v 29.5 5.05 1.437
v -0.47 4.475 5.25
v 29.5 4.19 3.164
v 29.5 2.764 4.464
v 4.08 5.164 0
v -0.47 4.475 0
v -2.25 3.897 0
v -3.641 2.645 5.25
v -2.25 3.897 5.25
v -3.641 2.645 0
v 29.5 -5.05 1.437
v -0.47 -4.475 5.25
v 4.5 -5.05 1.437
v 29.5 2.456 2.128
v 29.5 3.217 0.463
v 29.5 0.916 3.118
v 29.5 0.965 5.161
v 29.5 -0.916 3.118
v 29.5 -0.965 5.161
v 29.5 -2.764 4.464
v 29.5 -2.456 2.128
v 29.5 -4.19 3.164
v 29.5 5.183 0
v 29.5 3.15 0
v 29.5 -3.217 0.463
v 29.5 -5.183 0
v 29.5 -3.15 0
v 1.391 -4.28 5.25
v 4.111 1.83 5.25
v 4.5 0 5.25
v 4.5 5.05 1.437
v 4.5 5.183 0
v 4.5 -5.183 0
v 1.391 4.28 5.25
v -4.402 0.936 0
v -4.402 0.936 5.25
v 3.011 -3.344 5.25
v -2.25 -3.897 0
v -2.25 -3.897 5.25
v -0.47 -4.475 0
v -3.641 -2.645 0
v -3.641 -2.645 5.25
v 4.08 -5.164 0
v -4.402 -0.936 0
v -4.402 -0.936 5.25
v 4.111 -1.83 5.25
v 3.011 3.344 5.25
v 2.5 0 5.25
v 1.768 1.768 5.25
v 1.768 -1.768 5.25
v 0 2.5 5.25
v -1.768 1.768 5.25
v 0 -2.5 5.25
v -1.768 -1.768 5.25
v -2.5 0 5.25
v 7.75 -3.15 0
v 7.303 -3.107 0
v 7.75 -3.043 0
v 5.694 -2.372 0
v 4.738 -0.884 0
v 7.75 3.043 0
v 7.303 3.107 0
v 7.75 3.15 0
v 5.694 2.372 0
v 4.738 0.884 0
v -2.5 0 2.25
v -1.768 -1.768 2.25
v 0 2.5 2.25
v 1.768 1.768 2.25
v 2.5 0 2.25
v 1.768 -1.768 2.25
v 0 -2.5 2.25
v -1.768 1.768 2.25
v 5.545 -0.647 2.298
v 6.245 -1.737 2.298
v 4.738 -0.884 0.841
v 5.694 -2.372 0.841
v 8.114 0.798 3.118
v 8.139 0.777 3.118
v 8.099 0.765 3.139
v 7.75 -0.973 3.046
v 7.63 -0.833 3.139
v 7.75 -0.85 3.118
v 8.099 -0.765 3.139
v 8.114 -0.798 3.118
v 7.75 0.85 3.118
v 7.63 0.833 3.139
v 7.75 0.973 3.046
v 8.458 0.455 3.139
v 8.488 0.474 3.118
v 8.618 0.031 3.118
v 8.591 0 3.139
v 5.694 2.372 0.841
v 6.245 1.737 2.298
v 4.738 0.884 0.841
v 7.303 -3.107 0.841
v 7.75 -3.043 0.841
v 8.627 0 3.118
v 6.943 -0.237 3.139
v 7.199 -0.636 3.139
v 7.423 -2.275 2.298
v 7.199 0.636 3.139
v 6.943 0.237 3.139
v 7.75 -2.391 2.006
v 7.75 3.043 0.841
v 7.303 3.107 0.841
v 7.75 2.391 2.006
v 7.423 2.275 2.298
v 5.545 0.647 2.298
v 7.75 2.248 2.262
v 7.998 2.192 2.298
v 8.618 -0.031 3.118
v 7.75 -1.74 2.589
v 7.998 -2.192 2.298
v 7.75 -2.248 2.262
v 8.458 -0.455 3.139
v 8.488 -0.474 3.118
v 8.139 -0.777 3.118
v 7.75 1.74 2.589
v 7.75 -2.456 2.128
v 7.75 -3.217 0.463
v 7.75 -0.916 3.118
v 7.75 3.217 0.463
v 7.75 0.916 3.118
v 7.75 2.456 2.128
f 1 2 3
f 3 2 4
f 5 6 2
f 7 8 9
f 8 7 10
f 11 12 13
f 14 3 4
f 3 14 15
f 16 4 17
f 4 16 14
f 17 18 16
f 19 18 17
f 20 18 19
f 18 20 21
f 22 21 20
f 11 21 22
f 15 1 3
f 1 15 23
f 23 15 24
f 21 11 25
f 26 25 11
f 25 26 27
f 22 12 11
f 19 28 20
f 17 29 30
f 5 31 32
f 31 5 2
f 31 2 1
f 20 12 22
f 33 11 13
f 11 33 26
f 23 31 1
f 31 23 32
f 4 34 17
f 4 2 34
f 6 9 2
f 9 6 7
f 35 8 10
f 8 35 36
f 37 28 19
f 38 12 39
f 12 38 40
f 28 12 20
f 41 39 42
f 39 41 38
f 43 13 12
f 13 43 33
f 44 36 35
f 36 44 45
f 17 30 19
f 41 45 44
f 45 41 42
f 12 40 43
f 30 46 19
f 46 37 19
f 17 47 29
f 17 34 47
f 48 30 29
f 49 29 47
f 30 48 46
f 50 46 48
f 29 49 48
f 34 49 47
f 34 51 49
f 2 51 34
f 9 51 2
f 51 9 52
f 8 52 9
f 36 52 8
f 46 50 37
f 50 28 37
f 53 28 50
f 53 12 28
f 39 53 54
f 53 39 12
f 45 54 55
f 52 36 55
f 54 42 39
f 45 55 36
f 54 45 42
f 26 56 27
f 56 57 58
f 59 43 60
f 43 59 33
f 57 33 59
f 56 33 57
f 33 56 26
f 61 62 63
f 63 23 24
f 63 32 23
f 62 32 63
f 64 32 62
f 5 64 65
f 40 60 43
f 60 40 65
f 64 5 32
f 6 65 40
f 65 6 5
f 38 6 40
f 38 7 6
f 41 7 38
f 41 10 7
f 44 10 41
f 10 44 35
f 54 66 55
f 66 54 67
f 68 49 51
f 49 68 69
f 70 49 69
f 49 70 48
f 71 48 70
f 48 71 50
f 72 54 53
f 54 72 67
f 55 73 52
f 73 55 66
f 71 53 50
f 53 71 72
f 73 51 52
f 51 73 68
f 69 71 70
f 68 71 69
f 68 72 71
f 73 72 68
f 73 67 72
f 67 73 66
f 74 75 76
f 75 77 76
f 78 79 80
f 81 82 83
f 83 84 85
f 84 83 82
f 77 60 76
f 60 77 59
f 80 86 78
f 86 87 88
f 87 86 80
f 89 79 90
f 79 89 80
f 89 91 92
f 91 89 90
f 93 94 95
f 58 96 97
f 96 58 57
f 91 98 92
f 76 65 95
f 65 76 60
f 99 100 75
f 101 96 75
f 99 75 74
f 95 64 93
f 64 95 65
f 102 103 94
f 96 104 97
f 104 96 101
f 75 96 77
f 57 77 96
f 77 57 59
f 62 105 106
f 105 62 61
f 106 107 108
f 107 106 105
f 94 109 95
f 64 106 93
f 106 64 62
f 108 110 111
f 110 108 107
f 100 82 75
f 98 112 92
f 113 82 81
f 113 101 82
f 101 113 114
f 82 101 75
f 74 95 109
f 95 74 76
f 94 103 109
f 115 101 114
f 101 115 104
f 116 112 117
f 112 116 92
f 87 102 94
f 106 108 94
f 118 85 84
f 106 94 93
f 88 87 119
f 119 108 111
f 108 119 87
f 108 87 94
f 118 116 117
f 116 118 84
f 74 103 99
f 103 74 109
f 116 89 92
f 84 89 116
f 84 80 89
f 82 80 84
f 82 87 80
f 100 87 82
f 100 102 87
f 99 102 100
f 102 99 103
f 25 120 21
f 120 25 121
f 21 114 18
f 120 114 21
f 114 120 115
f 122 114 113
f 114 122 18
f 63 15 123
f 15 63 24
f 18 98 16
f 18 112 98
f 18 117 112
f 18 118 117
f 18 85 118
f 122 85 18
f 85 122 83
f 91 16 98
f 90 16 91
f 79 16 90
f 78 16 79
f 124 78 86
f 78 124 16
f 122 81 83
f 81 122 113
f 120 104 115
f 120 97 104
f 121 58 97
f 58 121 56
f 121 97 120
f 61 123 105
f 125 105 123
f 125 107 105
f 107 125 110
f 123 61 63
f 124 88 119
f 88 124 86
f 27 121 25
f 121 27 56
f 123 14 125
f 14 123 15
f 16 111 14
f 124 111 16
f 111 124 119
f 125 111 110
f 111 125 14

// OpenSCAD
// Uncomment before final render
//$fa = 0.01;
//$fs = 0.25;

module cAxisServoArm() {
  difference() {
    hull() {
      cylinder(5.25, 4.5, 4.5);
      translate([4.5, 0, 0]) {
        rotate([0, 90, 0]) {
          cylinder(25, 5.25, 5.25);
        }
      }
    }
    translate([-5.5, -6.125, -6.25]) {
      cube([36, 12.25, 6.25]);
    }
    translate([0, 0, 2.25]) {
      cylinder(4, 2.5, 2.5);
    }
    translate([7.75, 0, 0]) {
      sphere(3.25);
    }
    translate([7.75, 0, 0]) {
      rotate([0, 90, 0]) {
        cylinder(22.75, 3.25, 3.25);
      }
    }
  }
}

cAxisServoArm();
